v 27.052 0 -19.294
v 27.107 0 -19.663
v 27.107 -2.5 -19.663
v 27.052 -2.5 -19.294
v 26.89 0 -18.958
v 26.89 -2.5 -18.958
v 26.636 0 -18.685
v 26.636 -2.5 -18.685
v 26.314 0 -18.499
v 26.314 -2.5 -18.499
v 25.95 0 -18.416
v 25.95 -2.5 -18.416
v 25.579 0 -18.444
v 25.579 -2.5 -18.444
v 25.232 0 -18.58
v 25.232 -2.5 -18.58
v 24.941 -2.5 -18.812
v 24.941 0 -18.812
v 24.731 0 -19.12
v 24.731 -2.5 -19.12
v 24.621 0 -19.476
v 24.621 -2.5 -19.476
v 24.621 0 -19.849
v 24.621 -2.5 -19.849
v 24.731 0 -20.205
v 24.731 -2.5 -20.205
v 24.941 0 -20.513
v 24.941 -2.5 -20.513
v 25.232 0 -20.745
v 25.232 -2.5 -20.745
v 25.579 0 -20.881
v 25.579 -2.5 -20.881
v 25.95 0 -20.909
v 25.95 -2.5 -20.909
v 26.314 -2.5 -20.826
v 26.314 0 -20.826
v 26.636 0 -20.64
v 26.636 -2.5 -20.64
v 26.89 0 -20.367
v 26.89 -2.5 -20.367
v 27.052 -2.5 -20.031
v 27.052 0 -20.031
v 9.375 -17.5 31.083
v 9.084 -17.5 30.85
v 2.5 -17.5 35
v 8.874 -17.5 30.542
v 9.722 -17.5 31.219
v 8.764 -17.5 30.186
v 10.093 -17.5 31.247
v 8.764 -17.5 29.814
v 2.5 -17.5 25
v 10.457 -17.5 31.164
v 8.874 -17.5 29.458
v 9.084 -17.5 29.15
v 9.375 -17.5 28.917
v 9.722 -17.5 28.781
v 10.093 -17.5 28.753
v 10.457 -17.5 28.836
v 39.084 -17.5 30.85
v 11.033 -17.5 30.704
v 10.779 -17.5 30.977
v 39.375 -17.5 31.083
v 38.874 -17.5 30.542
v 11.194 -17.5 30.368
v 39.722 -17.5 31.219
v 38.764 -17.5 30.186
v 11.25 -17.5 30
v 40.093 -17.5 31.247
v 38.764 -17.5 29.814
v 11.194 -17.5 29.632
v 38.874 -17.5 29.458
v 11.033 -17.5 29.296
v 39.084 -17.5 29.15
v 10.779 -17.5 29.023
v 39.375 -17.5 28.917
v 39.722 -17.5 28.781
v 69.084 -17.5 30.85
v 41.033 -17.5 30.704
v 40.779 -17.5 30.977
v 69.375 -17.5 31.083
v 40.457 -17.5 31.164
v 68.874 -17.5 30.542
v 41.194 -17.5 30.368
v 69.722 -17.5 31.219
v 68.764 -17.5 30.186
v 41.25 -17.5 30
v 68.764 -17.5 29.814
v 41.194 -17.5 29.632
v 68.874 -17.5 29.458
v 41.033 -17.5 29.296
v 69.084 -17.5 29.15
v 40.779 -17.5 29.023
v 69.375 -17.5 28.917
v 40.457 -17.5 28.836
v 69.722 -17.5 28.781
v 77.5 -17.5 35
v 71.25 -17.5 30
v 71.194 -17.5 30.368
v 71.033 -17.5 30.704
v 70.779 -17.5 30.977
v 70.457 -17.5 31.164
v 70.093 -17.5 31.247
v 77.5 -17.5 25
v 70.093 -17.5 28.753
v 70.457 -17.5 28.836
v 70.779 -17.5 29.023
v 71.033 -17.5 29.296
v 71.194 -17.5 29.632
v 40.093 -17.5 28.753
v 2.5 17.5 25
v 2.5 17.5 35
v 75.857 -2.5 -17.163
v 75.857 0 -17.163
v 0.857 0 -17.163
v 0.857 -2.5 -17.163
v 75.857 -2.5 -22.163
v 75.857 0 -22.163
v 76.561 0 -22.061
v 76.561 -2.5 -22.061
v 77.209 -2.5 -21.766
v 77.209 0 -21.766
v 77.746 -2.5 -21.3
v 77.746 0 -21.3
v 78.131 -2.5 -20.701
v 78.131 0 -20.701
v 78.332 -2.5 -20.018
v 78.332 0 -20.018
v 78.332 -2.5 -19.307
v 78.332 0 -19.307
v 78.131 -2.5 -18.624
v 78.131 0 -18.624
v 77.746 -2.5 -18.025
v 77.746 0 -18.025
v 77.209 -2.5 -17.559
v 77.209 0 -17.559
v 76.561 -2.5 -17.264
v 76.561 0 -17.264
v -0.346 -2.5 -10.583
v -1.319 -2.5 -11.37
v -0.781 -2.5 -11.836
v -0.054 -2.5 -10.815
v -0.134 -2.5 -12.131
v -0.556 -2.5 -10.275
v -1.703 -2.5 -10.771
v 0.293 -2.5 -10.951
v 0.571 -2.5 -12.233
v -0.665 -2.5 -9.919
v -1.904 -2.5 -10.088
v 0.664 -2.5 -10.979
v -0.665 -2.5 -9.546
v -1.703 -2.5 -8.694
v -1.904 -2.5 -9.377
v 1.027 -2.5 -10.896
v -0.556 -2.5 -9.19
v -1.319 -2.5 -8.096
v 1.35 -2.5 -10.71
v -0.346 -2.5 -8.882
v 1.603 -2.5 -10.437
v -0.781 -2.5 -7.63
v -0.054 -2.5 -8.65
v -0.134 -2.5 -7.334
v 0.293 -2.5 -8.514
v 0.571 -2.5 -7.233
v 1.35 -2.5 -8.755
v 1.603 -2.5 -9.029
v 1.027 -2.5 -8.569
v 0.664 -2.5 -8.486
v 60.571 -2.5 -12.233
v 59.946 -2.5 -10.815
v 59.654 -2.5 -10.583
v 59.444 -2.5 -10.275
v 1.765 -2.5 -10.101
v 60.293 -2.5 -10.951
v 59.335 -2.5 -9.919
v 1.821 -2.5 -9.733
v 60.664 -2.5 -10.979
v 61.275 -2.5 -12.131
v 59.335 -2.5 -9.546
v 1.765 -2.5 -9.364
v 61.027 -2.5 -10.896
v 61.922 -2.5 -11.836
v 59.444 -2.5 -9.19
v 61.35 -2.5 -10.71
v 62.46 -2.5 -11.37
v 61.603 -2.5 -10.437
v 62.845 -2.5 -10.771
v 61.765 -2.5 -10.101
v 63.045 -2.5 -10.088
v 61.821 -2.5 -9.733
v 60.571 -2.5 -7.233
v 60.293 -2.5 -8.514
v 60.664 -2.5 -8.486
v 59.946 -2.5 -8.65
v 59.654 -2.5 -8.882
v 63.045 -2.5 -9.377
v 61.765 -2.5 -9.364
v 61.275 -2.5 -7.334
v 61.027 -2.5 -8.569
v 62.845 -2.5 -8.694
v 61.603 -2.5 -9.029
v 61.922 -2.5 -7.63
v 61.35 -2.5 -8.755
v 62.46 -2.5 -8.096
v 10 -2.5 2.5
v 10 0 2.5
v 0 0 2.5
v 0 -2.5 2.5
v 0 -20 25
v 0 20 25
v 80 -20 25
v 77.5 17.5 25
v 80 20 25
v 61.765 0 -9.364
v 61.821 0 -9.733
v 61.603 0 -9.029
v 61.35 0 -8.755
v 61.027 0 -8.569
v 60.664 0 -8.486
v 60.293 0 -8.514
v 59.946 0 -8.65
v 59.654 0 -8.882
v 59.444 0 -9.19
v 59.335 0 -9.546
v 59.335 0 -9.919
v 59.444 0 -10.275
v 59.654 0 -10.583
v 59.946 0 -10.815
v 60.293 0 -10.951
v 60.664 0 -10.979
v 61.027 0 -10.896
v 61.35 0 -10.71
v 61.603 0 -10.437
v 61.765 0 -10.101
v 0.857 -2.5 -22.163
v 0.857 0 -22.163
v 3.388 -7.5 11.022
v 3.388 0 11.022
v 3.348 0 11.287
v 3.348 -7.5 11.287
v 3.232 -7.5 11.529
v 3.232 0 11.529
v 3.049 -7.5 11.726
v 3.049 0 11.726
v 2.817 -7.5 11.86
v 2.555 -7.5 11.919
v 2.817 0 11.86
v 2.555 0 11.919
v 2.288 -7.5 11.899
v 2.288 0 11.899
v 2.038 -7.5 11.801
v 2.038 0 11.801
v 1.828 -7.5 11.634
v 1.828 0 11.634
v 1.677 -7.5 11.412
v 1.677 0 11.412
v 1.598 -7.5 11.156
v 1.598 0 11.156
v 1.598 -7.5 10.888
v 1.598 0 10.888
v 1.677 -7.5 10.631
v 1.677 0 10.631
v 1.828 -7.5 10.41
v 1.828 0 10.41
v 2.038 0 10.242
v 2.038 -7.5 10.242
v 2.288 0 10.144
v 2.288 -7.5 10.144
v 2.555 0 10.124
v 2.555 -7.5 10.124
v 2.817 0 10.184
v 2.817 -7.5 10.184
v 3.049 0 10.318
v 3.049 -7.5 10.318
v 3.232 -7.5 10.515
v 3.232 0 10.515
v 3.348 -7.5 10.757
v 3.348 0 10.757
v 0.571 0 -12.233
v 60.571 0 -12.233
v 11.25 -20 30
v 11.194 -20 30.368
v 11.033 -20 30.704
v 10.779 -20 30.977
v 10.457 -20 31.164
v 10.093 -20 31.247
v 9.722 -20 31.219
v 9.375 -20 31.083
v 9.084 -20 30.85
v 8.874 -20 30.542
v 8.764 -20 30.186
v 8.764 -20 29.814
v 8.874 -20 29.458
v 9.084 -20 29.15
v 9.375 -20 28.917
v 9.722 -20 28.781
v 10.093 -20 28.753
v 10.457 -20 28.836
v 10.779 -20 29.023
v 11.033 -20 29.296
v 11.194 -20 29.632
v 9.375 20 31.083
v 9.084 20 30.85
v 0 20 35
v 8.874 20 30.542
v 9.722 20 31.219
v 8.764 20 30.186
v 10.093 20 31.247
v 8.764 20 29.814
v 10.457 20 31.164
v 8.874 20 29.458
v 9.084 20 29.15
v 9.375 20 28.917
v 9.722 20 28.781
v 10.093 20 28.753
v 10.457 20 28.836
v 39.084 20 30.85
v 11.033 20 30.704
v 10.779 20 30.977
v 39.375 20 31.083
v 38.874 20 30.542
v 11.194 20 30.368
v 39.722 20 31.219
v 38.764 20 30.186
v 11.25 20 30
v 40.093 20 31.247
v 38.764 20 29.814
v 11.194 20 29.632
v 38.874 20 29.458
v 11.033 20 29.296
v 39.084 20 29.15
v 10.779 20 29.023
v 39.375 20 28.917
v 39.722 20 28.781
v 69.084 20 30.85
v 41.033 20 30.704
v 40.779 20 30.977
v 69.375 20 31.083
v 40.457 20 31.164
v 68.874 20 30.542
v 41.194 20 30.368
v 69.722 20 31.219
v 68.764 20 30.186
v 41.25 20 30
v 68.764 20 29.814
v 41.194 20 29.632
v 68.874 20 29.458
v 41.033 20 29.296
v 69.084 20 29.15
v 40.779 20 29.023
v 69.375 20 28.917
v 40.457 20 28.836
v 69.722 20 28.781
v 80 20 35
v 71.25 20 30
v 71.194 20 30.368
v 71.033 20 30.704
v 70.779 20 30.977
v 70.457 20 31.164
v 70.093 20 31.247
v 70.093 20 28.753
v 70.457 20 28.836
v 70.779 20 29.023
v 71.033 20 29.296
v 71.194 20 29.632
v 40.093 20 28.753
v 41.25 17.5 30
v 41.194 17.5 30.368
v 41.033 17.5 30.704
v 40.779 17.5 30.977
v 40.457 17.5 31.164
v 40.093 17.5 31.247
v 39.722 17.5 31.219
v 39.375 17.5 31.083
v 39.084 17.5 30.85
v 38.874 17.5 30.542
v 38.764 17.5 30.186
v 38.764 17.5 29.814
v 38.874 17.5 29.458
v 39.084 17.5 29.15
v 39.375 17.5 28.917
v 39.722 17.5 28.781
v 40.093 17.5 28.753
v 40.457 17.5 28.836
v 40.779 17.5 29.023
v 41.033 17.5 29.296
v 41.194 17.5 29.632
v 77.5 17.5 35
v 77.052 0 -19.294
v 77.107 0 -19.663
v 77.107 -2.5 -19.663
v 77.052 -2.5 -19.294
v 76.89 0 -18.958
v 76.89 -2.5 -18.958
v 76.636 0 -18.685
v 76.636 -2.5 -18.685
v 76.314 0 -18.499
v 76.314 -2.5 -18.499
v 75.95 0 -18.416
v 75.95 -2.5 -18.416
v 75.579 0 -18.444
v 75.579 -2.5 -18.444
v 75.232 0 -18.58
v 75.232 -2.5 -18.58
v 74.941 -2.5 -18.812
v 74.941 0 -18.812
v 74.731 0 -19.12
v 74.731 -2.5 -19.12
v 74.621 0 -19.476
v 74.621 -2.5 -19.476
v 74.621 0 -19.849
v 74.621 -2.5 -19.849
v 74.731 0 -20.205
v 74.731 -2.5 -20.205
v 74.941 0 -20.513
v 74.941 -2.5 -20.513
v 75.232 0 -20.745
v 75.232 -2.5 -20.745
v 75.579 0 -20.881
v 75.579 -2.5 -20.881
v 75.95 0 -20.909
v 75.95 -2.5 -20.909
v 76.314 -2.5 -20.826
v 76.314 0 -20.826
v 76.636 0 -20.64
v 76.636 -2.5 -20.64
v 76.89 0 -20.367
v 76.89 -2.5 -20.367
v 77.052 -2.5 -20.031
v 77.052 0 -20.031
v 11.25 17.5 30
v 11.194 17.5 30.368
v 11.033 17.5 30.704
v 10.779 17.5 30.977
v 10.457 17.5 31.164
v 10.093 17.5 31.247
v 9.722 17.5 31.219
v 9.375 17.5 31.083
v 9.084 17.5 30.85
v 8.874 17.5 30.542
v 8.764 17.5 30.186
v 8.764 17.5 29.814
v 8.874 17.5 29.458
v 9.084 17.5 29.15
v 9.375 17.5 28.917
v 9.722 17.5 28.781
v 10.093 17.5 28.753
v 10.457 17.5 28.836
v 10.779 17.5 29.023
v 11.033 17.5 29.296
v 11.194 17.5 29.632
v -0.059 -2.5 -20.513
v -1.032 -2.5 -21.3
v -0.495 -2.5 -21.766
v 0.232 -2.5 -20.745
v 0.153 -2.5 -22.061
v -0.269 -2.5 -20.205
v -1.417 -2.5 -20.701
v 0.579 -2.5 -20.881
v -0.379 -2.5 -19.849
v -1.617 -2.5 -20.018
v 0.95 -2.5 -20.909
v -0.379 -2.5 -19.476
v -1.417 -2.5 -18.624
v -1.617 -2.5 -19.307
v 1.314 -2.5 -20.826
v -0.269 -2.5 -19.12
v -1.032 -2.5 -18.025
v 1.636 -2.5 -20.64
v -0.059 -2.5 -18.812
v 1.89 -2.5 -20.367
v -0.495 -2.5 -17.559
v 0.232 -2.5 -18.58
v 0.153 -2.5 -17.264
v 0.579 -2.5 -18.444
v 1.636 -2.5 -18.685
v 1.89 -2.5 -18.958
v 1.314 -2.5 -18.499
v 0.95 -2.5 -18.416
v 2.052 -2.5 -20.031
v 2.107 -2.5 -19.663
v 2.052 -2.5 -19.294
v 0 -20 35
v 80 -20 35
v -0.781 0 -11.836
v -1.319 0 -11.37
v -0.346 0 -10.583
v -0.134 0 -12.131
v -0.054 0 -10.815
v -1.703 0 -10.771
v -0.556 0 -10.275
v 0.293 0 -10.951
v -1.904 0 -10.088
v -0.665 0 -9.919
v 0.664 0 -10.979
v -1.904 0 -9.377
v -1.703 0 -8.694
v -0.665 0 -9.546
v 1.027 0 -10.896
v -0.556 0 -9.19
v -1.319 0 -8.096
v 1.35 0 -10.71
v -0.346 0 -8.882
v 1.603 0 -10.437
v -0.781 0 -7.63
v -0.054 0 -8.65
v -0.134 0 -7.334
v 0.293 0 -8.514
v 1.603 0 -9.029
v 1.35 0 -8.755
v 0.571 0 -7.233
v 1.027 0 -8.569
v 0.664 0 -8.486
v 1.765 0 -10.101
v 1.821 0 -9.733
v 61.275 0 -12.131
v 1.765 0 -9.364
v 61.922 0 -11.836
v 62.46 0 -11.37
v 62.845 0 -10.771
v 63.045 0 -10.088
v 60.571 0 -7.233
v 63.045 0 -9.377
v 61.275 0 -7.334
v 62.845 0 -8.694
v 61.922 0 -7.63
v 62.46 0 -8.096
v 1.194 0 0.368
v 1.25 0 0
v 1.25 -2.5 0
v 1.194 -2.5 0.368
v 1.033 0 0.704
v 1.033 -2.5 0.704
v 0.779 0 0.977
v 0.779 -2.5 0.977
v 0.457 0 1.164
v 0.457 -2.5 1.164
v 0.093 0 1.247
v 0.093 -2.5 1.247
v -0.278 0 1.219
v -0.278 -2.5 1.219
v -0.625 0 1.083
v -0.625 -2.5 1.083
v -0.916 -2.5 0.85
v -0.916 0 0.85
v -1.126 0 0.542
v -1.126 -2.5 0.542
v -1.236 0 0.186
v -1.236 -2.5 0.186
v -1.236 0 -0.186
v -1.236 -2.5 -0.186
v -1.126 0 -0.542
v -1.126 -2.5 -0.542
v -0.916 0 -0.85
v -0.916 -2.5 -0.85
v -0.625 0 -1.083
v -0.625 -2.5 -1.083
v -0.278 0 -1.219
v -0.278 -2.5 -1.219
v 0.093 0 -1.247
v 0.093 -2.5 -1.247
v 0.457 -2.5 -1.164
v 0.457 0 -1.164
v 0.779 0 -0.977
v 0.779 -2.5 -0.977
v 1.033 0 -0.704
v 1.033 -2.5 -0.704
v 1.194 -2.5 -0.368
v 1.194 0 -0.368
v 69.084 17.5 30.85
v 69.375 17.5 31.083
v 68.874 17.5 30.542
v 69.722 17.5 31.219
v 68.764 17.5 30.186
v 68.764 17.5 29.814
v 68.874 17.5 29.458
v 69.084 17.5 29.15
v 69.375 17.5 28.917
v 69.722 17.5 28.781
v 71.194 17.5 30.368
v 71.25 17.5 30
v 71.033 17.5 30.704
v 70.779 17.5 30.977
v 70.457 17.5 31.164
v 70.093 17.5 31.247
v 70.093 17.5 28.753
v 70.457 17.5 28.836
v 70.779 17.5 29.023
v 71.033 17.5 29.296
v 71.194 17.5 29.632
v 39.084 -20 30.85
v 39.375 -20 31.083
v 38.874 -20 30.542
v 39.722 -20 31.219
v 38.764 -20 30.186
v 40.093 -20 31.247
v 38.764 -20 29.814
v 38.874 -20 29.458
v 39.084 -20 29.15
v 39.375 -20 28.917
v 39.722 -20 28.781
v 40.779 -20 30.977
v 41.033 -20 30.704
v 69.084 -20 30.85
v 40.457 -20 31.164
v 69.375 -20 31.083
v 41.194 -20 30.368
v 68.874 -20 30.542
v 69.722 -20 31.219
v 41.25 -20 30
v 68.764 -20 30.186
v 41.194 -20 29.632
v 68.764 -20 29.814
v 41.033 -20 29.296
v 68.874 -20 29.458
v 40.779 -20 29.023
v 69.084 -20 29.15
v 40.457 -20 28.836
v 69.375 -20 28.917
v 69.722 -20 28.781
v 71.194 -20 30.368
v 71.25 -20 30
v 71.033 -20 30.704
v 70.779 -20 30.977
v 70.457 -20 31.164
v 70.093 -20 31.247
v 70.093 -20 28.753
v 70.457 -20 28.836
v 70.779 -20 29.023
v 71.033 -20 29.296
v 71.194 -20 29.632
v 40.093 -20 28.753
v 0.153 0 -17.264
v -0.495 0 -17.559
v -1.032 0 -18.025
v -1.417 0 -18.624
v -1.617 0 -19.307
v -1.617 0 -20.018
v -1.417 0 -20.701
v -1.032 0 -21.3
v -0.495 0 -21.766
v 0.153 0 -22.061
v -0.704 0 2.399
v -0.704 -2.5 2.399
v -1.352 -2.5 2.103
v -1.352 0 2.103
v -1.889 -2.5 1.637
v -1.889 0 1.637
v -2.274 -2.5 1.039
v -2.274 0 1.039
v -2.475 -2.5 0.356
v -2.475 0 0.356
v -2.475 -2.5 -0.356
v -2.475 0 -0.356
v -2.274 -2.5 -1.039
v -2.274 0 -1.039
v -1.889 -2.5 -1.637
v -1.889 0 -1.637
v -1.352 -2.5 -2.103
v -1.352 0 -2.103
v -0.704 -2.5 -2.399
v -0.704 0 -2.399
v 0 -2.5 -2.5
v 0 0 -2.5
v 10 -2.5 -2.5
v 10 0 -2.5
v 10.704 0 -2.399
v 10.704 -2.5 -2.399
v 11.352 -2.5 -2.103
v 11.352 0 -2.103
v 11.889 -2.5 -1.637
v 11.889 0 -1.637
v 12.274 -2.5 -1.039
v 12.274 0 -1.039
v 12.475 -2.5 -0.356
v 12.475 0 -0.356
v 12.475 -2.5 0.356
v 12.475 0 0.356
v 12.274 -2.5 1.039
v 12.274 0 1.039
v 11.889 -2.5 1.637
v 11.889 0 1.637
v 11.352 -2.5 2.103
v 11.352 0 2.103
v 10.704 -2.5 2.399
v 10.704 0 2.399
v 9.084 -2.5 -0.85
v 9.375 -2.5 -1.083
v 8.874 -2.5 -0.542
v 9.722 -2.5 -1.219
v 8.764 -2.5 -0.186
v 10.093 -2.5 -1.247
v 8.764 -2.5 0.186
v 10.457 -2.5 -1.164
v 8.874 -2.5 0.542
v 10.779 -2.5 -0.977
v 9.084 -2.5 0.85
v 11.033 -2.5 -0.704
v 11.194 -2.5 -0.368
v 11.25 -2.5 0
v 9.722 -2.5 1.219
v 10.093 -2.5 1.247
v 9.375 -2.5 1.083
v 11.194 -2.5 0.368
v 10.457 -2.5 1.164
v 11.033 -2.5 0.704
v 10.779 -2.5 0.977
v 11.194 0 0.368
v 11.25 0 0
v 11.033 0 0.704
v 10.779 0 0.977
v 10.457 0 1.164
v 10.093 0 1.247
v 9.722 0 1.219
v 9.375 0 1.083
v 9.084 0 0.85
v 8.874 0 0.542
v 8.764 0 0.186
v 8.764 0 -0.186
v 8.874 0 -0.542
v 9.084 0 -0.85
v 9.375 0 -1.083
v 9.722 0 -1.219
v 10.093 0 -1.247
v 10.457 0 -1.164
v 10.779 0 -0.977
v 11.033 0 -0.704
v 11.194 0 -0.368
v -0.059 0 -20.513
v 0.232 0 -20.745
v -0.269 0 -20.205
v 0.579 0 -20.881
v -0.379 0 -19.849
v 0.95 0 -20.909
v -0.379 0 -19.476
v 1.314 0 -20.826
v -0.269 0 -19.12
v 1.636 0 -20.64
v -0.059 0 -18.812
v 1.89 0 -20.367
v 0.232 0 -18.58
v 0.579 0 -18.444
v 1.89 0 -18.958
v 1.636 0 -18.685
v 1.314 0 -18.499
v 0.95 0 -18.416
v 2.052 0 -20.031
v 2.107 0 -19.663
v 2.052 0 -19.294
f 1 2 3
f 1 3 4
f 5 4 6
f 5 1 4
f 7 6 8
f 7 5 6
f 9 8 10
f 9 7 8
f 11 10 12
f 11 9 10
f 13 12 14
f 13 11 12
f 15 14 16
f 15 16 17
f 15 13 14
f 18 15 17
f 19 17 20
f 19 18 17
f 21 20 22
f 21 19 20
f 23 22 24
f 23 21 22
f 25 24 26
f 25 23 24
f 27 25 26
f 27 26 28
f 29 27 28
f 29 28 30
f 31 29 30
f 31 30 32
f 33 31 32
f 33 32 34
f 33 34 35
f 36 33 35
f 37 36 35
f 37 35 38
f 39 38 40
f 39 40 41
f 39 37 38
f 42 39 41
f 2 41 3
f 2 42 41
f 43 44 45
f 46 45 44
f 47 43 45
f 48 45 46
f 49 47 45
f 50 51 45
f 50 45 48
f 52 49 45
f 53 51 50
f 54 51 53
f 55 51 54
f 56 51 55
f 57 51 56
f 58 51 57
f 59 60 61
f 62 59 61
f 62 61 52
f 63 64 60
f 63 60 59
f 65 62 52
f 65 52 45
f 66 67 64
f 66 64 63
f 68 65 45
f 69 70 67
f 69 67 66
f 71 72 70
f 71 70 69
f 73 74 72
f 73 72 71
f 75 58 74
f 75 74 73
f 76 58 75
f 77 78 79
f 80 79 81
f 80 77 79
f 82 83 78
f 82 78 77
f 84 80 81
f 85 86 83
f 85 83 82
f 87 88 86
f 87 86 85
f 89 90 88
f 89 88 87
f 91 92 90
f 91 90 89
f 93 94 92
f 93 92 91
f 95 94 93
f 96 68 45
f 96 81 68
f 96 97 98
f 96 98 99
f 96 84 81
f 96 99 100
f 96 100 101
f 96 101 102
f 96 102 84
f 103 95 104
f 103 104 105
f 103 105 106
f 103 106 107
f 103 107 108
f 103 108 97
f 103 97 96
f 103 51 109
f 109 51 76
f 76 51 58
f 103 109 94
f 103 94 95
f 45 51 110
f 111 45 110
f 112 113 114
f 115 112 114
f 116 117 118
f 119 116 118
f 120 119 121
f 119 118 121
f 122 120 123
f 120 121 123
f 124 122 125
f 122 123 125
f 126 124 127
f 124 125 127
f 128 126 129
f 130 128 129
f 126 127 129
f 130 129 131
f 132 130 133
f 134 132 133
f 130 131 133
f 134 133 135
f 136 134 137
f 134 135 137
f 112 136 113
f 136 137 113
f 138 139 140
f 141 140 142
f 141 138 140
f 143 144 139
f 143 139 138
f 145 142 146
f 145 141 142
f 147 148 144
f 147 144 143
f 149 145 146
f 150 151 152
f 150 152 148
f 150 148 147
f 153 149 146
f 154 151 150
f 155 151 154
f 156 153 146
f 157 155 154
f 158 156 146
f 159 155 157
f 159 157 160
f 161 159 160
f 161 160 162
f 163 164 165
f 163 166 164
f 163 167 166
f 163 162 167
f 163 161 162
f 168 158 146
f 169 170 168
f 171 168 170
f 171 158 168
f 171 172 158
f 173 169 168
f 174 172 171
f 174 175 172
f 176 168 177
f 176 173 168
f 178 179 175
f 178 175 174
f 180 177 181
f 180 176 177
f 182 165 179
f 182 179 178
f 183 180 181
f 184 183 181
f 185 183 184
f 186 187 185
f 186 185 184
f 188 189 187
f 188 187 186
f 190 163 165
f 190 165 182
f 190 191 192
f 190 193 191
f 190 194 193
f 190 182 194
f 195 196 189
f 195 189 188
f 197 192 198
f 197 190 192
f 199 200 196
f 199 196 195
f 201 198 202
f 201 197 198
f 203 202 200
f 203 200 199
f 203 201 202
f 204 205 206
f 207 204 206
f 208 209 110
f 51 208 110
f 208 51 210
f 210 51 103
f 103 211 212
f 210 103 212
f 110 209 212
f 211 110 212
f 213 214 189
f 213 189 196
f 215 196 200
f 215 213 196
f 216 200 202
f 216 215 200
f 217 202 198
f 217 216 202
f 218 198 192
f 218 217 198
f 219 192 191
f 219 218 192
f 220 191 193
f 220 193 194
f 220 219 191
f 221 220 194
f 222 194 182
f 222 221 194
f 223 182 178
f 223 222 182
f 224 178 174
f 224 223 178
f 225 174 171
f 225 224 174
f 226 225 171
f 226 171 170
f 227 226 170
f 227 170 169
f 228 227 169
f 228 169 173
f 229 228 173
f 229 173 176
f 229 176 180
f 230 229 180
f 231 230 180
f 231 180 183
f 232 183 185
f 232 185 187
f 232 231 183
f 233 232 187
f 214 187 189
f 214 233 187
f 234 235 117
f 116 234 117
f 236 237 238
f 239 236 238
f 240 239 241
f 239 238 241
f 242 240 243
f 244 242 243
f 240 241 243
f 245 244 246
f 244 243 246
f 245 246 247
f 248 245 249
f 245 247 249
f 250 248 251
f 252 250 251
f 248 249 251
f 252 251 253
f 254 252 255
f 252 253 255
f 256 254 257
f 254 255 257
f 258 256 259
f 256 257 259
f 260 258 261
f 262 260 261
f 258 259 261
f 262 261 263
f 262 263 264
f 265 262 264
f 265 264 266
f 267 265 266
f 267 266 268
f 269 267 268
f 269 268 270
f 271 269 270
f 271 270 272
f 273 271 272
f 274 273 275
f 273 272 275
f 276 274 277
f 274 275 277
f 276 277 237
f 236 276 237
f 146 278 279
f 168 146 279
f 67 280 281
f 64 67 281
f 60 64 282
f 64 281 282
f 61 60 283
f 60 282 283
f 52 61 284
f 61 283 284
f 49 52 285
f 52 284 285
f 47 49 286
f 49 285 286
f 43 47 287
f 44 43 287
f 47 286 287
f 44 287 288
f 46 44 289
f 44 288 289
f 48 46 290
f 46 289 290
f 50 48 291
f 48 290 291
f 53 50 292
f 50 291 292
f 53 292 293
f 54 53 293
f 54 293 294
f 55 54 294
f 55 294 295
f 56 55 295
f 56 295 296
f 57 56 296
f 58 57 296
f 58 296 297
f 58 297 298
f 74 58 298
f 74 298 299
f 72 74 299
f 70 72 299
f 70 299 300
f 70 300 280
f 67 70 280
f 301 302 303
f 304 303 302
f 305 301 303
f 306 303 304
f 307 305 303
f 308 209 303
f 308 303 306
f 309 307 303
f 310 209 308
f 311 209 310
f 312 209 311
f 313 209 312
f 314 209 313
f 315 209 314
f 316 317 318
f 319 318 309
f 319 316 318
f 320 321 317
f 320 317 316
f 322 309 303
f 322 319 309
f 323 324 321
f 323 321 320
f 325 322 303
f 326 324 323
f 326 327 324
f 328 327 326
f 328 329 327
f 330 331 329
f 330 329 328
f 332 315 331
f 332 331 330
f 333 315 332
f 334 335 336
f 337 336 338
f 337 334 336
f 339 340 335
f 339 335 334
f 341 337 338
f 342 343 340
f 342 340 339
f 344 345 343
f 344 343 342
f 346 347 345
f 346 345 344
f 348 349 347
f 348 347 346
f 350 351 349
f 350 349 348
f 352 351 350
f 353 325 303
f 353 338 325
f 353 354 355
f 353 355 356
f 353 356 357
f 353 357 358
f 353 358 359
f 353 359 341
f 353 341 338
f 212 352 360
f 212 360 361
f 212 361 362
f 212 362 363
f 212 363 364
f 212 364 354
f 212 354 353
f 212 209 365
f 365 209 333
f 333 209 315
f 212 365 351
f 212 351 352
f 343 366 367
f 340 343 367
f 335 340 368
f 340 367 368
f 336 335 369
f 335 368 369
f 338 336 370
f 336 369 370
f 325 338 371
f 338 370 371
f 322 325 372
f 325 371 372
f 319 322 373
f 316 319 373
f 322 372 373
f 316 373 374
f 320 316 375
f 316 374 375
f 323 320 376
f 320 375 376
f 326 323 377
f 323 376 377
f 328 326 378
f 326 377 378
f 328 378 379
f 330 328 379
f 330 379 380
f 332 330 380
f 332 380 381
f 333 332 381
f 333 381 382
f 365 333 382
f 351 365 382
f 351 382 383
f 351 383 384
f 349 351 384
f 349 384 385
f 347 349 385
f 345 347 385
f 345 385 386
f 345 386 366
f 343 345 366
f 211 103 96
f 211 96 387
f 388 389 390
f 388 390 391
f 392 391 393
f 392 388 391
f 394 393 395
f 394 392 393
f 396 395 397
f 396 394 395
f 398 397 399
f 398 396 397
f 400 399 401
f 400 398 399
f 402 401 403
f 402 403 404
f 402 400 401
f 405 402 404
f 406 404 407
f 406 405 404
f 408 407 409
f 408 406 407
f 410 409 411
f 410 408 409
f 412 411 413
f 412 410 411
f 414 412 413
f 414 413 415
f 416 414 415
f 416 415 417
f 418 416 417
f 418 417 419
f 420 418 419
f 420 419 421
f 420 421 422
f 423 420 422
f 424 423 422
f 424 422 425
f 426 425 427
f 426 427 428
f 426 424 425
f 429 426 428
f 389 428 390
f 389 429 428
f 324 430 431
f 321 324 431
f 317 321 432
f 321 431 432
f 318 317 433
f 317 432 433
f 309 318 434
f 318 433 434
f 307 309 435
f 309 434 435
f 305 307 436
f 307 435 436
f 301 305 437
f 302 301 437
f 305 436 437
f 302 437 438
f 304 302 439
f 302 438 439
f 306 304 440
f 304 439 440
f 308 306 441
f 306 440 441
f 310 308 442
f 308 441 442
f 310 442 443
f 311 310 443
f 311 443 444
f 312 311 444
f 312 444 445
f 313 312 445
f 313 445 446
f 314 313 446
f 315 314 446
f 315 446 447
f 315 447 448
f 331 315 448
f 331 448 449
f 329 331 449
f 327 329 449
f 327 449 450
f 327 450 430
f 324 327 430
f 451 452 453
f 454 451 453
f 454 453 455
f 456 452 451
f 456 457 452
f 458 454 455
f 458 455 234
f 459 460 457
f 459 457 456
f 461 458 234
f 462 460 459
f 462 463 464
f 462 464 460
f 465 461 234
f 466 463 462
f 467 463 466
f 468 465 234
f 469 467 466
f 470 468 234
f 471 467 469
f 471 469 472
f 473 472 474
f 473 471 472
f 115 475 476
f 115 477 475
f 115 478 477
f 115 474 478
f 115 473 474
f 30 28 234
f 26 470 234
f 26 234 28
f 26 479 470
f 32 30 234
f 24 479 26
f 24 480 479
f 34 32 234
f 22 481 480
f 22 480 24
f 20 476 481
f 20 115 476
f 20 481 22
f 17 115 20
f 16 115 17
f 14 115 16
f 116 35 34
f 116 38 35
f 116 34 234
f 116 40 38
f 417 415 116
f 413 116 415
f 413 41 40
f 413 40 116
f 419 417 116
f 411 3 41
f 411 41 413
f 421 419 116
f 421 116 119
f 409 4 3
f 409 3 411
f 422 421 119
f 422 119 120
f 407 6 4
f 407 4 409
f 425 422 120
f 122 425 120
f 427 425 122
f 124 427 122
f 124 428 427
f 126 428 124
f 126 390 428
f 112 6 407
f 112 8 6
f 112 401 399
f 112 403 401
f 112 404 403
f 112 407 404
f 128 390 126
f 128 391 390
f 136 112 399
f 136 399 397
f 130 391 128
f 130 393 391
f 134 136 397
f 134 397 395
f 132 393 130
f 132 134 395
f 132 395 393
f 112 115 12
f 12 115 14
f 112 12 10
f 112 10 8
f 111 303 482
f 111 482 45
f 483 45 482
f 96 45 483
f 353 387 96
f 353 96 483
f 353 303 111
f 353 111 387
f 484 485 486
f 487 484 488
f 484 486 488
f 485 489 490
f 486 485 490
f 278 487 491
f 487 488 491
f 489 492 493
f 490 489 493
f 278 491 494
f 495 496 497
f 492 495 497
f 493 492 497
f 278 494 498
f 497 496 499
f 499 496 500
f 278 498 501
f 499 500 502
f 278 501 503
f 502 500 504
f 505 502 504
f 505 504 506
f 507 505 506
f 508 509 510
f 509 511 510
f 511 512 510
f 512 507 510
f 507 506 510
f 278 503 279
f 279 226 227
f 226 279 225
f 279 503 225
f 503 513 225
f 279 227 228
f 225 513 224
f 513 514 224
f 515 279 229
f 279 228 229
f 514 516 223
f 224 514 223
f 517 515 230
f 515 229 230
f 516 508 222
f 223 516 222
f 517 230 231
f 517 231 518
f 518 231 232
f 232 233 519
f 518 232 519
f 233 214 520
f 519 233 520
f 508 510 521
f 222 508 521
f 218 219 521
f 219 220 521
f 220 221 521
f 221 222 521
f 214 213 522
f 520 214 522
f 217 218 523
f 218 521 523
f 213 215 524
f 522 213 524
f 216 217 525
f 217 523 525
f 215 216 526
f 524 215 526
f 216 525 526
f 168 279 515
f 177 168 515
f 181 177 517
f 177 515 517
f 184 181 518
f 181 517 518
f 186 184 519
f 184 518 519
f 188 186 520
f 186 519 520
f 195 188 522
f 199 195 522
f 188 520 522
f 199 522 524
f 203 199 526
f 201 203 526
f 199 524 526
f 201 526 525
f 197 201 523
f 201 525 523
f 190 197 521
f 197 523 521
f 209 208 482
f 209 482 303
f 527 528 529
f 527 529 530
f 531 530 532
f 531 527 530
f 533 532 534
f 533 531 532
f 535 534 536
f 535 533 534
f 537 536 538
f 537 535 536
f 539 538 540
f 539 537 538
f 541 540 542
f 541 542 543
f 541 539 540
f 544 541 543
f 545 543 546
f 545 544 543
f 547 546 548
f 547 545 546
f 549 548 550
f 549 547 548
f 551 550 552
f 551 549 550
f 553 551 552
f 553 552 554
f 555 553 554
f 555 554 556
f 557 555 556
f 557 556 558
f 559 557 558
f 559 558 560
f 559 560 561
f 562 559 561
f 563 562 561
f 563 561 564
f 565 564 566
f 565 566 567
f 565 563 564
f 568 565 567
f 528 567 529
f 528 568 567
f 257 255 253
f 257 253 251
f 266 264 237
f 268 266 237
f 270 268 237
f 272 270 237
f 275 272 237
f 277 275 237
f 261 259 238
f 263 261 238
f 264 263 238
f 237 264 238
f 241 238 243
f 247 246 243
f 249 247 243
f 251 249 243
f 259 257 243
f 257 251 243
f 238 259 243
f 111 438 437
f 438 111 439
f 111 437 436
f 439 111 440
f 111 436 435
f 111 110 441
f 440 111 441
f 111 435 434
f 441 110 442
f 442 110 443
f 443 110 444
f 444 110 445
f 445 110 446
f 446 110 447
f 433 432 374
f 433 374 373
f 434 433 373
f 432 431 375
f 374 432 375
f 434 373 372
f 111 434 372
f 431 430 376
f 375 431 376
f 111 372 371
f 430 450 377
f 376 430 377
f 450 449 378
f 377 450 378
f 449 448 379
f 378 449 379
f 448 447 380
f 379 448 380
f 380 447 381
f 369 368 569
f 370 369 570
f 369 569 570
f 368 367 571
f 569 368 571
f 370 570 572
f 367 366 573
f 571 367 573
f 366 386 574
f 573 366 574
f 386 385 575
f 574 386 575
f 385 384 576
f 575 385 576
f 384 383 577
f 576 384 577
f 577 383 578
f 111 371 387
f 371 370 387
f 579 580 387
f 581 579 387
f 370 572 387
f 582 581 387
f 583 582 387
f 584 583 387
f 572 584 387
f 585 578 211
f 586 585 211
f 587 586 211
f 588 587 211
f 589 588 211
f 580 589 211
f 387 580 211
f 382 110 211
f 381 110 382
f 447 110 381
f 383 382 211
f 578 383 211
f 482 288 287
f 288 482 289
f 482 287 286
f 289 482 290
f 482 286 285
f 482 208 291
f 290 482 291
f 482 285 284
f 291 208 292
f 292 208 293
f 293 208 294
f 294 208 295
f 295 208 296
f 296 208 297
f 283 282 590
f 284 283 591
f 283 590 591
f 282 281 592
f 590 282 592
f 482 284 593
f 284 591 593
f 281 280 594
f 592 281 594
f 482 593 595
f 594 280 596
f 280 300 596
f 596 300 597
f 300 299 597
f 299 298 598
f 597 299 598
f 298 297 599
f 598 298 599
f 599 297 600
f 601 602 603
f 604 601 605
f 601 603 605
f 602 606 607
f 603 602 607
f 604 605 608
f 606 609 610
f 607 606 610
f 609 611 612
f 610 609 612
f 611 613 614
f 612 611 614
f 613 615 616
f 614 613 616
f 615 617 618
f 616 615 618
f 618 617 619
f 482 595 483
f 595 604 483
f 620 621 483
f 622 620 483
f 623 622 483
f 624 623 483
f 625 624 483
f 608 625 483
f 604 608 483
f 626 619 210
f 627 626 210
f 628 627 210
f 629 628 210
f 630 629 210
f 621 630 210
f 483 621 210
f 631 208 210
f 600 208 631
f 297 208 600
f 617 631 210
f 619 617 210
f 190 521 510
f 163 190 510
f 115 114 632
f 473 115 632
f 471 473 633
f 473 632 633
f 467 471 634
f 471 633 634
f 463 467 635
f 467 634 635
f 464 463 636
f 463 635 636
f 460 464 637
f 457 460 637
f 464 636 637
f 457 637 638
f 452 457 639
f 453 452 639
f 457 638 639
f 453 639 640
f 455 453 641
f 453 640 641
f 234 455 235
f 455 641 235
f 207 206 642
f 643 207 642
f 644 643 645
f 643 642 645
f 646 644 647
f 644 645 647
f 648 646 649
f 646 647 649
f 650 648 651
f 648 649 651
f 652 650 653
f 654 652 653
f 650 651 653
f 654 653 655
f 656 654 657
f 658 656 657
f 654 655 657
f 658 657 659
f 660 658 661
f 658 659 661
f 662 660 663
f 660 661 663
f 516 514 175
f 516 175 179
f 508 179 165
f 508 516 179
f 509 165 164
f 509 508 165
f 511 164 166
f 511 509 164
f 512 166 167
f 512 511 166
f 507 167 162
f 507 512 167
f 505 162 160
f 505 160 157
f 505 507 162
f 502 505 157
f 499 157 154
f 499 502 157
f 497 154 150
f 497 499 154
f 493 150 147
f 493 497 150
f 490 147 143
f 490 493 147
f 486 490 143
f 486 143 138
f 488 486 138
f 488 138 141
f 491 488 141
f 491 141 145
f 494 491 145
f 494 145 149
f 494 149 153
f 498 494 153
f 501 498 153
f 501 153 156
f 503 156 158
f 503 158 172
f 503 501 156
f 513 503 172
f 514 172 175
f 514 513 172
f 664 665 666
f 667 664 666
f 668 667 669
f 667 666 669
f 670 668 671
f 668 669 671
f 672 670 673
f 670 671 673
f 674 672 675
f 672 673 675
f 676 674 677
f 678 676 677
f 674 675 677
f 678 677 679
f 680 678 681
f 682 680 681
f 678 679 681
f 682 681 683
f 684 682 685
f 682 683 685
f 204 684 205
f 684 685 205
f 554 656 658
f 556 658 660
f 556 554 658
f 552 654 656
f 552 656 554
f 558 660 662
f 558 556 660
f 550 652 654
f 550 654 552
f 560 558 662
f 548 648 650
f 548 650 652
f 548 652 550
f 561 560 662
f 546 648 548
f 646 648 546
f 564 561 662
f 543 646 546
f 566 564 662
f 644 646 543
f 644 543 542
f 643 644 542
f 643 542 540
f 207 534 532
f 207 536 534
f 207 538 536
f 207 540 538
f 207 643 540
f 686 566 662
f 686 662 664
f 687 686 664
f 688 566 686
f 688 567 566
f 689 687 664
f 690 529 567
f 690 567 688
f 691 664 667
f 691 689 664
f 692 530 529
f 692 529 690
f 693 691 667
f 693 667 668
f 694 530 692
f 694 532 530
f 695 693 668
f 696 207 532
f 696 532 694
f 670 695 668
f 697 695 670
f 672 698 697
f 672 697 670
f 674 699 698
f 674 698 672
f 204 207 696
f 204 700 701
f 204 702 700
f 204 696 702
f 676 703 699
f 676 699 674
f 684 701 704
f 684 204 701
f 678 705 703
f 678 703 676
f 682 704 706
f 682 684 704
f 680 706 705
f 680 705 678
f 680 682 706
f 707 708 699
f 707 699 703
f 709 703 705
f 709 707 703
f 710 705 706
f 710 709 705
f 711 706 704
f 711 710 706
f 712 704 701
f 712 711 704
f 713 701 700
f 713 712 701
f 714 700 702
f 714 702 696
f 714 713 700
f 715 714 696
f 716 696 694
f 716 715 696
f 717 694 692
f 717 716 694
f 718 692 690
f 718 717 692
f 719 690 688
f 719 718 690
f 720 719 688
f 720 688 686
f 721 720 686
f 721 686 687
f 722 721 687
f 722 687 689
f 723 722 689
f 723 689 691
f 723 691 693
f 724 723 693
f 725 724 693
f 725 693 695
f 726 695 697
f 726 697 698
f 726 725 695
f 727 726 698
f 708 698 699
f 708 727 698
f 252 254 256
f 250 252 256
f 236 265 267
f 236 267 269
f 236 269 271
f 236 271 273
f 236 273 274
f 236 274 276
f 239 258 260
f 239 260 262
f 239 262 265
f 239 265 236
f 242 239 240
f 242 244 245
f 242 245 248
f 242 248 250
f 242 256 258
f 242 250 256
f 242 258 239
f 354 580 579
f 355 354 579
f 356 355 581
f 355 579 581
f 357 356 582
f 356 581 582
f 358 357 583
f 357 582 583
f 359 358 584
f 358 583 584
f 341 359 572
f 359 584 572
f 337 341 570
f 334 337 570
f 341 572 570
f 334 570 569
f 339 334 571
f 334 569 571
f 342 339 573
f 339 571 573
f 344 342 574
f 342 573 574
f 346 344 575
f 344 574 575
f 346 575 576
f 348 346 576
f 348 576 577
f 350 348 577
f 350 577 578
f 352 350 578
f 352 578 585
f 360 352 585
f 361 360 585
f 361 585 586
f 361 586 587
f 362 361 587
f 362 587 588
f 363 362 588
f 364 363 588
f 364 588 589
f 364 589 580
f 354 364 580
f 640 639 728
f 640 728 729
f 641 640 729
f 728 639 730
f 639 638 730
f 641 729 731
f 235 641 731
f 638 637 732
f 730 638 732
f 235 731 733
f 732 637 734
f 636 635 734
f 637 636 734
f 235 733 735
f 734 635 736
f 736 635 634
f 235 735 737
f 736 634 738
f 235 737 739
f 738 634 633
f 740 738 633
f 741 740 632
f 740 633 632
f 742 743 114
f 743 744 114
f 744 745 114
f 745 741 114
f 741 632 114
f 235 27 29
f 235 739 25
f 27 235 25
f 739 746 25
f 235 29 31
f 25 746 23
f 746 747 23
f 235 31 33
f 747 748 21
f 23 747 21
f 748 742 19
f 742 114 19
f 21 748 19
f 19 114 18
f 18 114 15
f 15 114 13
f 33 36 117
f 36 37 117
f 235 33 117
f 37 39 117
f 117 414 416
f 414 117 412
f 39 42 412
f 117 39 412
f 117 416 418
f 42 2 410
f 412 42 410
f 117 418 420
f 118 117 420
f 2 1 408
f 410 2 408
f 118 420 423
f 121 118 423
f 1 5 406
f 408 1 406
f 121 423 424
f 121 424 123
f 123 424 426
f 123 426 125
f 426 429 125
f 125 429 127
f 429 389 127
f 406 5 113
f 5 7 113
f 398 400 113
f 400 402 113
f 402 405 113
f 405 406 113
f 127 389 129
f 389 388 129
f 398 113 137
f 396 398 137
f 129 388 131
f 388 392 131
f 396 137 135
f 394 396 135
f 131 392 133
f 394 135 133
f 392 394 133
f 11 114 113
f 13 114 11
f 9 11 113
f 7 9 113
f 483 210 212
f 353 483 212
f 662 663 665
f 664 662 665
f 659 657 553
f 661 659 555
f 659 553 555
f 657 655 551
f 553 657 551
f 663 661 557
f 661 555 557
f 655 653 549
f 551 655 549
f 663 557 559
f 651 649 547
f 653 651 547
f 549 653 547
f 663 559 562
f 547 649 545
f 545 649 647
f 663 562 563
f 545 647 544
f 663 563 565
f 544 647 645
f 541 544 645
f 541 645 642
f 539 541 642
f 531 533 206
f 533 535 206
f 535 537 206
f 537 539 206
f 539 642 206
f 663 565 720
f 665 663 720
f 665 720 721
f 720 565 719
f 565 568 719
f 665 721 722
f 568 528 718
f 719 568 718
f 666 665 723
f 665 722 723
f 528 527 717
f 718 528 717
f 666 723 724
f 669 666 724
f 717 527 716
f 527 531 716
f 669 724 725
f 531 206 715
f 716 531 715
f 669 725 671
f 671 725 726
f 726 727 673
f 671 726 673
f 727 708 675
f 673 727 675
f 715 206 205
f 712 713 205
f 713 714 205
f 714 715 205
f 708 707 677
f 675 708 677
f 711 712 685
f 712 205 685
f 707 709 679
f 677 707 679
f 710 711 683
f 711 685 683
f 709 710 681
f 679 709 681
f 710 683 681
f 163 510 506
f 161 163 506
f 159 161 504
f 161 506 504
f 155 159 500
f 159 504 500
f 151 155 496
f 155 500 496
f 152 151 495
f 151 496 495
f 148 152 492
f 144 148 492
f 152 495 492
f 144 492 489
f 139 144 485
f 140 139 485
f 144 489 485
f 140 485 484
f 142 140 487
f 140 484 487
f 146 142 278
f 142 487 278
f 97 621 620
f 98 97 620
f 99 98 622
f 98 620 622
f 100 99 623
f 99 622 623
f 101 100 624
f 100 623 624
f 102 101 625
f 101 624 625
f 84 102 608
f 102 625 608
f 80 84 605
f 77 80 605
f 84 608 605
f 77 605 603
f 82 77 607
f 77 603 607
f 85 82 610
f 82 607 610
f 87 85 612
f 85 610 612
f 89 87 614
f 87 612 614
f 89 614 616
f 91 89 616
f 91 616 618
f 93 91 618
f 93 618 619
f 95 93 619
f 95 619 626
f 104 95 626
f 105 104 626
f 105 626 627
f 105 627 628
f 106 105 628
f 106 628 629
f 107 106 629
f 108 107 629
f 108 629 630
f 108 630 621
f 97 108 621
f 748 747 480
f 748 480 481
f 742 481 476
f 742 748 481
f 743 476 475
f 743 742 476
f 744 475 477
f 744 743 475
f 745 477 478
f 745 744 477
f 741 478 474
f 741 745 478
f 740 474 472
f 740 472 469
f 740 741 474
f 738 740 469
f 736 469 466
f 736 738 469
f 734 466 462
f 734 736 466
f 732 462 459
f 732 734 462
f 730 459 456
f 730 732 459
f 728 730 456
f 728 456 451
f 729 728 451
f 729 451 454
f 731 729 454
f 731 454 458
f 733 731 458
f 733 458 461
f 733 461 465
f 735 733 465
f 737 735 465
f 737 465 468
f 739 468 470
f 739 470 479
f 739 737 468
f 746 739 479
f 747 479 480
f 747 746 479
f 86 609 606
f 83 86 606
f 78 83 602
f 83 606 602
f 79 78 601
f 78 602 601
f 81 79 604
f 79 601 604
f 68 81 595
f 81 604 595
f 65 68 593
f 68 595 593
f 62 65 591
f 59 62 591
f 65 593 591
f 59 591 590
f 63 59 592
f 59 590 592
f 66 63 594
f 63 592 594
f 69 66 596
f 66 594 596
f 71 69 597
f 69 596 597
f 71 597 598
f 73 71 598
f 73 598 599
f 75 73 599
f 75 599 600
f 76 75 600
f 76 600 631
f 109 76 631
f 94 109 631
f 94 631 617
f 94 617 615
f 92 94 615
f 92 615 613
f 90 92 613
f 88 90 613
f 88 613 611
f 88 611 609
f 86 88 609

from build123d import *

# Parameters (mm, degrees)
F1_R      = 1.25
F2_DEPTH  = 2.5
F3_R      = 1.25
F4_DEPTH  = 2.5
F5_R      = 1.25
F6_DEPTH  = 2.5
F8_W      = 80
F8_H      = 40
F8_W_2    = 75
F8_H_2    = 35
F9_DEPTH  = 10
F10_R     = 1.25
F11_DEPTH = 40.001
F12_R     = 0.9
F13_DEPTH = 7.5


with BuildPart() as f2:
    # F1 (on Front) → F2 (new body)
    with BuildSketch(Plane.XZ):
        with BuildLine():
            Line((10, 2.5), (0, 2.5))
            ThreePointArc((0, 2.5), (-2.5, 0), (0, -2.5))
            Line((0, -2.5), (10, -2.5))
            ThreePointArc((10, -2.5), (12.5, 0), (10, 2.5))
        make_face()
        Circle(F1_R, mode=Mode.SUBTRACT)
        with Locations((10, 0)):
            Circle(F1_R, mode=Mode.SUBTRACT)
    extrude(amount=F2_DEPTH)


with BuildPart() as f4:
    # F3 (on Front) → F4 (new body)
    with BuildSketch(Plane.XZ):
        with BuildLine():
            Line((60.5706622079, -7.232673876), (0.5706622079, -7.232673876))
            ThreePointArc((0.5706622079, -7.232673876), (-1.9293377921, -9.732673876), (0.5706622079, -12.232673876))
            Line((0.5706622079, -12.232673876), (60.5706622079, -12.232673876))
            ThreePointArc((60.5706622079, -12.232673876), (63.0706622079, -9.732673876), (60.5706622079, -7.232673876))
        make_face()
        with Locations((0.5706622079, -9.732673876)):
            Circle(F3_R, mode=Mode.SUBTRACT)
        with Locations((60.5706622079, -9.732673876)):
            Circle(F3_R, mode=Mode.SUBTRACT)
    extrude(amount=F4_DEPTH)


with BuildPart() as f6:
    # F5 (on Front) → F6 (new body)
    with BuildSketch(Plane.XZ):
        with BuildLine():
            Line((75.8570737601, -17.1626018733), (0.8570737601, -17.1626018733))
            ThreePointArc((0.8570737601, -17.1626018733), (-1.6429262399, -19.6626018733), (0.8570737601, -22.1626018733))
            Line((0.8570737601, -22.1626018733), (75.8570737601, -22.1626018733))
            ThreePointArc((75.8570737601, -22.1626018733), (78.3570737601, -19.6626018733), (75.8570737601, -17.1626018733))
        make_face()
        with Locations((0.8570737601, -19.6626018733)):
            Circle(F5_R, mode=Mode.SUBTRACT)
        with Locations((25.8570737601, -19.6626018733)):
            Circle(F5_R, mode=Mode.SUBTRACT)
        with Locations((75.8570737601, -19.6626018733)):
            Circle(F5_R, mode=Mode.SUBTRACT)
    extrude(amount=F6_DEPTH)


with BuildPart() as f9:
    # F8 (on offset) → F9 (new body)
    with BuildSketch(Plane.XY.offset(25)):
        with Locations((40, 0)):
            Rectangle(F8_W, F8_H)
        with Locations((40, 0)):
            Rectangle(F8_W_2, F8_H_2, mode=Mode.SUBTRACT)
    extrude(amount=F9_DEPTH)

    # F10 (on face) → F11 (cut, through all)
    with BuildSketch(Plane.XZ.offset(20)):
        with Locations((10, 30)):
            Circle(F10_R)
        with Locations((70, 30)):
            Circle(F10_R)
        with Locations((40, 30)):
            Circle(F10_R)
    extrude(amount=-F11_DEPTH, mode=Mode.SUBTRACT)


with BuildPart() as f13:
    # F12 (on Front) → F13 (new body)
    with BuildSketch(Plane.XZ):
        with Locations((2.488047583, 11.0218990594)):
            Circle(F12_R)
    extrude(amount=F13_DEPTH)


solid = Compound([f2.part, f4.part, f6.part, f9.part, f13.part])
